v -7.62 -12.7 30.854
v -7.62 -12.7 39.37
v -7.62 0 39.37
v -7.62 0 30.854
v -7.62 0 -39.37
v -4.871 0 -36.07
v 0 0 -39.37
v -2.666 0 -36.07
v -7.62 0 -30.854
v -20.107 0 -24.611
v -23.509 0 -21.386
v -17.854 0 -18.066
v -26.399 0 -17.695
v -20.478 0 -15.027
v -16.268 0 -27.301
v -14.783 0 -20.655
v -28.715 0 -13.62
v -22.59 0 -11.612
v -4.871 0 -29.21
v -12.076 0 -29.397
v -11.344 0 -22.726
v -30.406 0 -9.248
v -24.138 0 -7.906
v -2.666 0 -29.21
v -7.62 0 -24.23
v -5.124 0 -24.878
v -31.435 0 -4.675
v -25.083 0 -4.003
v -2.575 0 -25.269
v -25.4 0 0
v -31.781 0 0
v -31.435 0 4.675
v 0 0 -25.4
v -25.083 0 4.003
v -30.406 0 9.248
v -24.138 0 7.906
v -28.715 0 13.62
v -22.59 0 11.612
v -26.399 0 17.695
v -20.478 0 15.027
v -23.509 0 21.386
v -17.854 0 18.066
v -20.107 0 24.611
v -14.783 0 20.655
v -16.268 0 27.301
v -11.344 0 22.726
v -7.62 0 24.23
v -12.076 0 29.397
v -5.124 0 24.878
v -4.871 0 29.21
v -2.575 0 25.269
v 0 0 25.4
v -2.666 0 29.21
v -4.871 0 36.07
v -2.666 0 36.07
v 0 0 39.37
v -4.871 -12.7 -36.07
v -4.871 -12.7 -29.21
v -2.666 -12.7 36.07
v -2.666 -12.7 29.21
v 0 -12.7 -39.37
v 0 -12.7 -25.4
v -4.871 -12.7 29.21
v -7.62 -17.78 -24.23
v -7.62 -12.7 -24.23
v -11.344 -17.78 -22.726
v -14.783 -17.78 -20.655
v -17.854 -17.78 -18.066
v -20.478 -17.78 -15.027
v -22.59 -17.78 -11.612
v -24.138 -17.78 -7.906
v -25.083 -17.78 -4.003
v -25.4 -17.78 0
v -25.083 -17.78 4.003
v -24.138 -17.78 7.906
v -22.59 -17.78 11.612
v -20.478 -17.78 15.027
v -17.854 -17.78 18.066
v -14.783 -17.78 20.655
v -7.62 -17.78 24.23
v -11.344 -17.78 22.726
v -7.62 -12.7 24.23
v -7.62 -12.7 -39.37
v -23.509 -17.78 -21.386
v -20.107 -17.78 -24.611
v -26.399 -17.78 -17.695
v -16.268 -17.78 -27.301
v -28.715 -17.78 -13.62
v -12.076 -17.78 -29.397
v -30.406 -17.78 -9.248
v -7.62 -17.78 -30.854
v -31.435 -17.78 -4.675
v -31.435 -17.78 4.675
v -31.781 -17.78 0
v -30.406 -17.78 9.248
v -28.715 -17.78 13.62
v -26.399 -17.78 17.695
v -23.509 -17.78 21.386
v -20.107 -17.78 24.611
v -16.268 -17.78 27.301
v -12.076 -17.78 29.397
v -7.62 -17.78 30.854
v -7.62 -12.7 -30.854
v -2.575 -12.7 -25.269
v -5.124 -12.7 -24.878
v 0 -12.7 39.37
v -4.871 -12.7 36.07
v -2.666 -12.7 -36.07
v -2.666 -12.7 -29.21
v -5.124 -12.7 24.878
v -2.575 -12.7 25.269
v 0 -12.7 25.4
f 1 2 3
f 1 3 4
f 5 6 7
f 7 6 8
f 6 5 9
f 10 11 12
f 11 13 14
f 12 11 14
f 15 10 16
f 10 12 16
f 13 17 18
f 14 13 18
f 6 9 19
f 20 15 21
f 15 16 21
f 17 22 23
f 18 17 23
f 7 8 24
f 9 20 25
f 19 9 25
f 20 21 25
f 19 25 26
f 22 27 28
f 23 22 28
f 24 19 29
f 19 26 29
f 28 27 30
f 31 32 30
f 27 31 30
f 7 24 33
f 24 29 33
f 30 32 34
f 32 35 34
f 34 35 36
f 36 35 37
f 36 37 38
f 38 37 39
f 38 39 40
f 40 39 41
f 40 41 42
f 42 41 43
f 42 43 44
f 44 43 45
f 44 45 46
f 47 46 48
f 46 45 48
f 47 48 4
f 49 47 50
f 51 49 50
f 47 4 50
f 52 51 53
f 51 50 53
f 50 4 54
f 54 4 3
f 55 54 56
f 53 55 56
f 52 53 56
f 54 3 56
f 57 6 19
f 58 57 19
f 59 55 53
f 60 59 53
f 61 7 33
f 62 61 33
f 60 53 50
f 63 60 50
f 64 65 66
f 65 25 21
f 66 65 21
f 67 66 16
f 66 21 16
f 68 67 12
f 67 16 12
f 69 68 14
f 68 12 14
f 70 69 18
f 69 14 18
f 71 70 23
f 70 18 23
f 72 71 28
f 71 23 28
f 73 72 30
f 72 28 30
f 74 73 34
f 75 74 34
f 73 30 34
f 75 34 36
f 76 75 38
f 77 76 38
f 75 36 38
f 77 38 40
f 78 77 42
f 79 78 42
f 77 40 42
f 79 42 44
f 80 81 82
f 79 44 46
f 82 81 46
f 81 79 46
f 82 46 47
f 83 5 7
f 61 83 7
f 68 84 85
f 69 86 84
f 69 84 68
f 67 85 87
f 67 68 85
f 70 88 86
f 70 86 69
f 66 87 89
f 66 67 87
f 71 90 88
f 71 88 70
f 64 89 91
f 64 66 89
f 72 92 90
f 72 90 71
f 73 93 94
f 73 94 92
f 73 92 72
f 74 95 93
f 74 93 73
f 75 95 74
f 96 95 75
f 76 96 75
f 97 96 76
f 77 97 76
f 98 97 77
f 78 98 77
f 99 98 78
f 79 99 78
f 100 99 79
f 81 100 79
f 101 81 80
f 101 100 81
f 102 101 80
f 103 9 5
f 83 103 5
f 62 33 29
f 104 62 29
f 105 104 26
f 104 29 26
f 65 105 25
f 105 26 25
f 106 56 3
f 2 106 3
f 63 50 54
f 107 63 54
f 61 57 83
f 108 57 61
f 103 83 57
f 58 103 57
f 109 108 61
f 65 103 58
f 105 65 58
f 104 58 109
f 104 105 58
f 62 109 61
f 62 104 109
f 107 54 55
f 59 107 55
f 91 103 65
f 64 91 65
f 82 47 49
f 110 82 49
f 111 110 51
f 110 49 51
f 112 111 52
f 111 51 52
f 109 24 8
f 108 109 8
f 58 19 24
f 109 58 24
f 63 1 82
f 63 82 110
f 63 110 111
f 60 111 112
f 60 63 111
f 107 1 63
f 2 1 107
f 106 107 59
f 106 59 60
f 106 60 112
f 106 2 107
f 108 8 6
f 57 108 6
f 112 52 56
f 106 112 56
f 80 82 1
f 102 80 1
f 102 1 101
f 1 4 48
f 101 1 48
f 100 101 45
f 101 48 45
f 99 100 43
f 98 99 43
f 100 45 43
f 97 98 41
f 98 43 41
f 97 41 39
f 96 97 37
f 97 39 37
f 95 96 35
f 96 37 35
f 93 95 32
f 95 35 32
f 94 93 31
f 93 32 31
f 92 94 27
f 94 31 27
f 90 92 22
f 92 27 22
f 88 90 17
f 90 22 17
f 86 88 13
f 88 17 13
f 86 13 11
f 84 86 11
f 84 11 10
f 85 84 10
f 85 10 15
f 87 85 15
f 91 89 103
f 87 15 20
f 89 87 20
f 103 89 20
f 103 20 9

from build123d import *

# Parameters (mm, degrees)
F1_DEPTH = 12.7
F2_DEPTH = 17.78


with BuildPart() as f1:
    # F0 (on Front) → F1 (new body)
    with BuildSketch(Plane.XZ):
        with BuildLine():
            ThreePointArc((-7.62, 24.2300557169), (-3.8546455617, 25.1058102362), (0, 25.4))
            Line((0, 25.4), (0, 31.7809050116))
            ThreePointArc((0, 31.7809050116), (-1.3343592112, 31.7528803237), (-2.6663651224, 31.6688556849))
            Line((-2.6663651224, 31.6688556849), (-2.6663651224, 29.21))
            Line((-2.6663651224, 29.21), (-4.8713176511, 29.21))
            Line((-4.8713176511, 29.21), (-4.8713176511, 31.405352851))
            ThreePointArc((-4.8713176511, 31.405352851), (-6.251742675, 31.1599364069), (-7.62, 30.8538737172))
            Line((-7.62, 30.8538737172), (-7.62, 24.2300557169))
        make_face()
        with BuildLine():
            ThreePointArc((-7.62, -24.2300557169), (-25.400000003, 0), (-7.62, 24.2300557169))
            Line((-7.62, 24.2300557169), (-7.62, 30.8538737172))
            ThreePointArc((-7.62, 30.8538737172), (-31.7809050116, 0), (-7.62, -30.8538737172))
            Line((-7.62, -30.8538737172), (-7.62, -24.2300557169))
        make_face()
        with BuildLine():
            ThreePointArc((-2.6663651224, 31.6688556849), (-1.3343592112, 31.7528803237), (0, 31.7809050116))
            Line((0, 31.7809050116), (0, 39.37))
            Line((0, 39.37), (-7.62, 39.37))
            Line((-7.62, 39.37), (-7.62, 30.8538737172))
            ThreePointArc((-7.62, 30.8538737172), (-6.251742675, 31.1599364069), (-4.8713176511, 31.405352851))
            Line((-4.8713176511, 31.405352851), (-4.8713176511, 36.0698501384))
            Line((-4.8713176511, 36.0698501384), (-2.6663651224, 36.0698501384))
            Line((-2.6663651224, 36.0698501384), (-2.6663651224, 31.6688556849))
        make_face()
        with BuildLine():
            ThreePointArc((0, -25.4), (-3.8546455617, -25.1058102362), (-7.62, -24.2300557169))
            Line((-7.62, -24.2300557169), (-7.62, -30.8538737172))
            ThreePointArc((-7.62, -30.8538737172), (-6.251742675, -31.1599364069), (-4.8713176511, -31.405352851))
            Line((-4.8713176511, -31.405352851), (-4.8713176511, -29.21))
            Line((-4.8713176511, -29.21), (-2.6663651224, -29.21))
            Line((-2.6663651224, -29.21), (-2.6663651224, -31.6688556849))
            ThreePointArc((-2.6663651224, -31.6688556849), (-1.3343592112, -31.7528803237), (0, -31.7809050116))
            Line((0, -31.7809050116), (0, -25.4))
        make_face()
        with BuildLine():
            ThreePointArc((-4.8713176511, -31.405352851), (-6.251742675, -31.1599364069), (-7.62, -30.8538737172))
            Line((-7.62, -30.8538737172), (-7.62, -39.37))
            Line((-7.62, -39.37), (0, -39.37))
            Line((0, -39.37), (0, -31.7809050116))
            ThreePointArc((0, -31.7809050116), (-1.3343592112, -31.7528803237), (-2.6663651224, -31.6688556849))
            Line((-2.6663651224, -31.6688556849), (-2.6663651224, -36.0698501384))
            Line((-2.6663651224, -36.0698501384), (-4.8713176511, -36.0698501384))
            Line((-4.8713176511, -36.0698501384), (-4.8713176511, -31.405352851))
        make_face()
    extrude(amount=F1_DEPTH)

    # F0 (on Front) → F2 (join)
    with BuildSketch(Plane.XZ):
        with BuildLine():
            ThreePointArc((-7.62, -24.2300557169), (-25.400000003, 0), (-7.62, 24.2300557169))
            Line((-7.62, 24.2300557169), (-7.62, 30.8538737172))
            ThreePointArc((-7.62, 30.8538737172), (-31.7809050116, 0), (-7.62, -30.8538737172))
            Line((-7.62, -30.8538737172), (-7.62, -24.2300557169))
        make_face()
    extrude(amount=F2_DEPTH)


solid = f1.part
